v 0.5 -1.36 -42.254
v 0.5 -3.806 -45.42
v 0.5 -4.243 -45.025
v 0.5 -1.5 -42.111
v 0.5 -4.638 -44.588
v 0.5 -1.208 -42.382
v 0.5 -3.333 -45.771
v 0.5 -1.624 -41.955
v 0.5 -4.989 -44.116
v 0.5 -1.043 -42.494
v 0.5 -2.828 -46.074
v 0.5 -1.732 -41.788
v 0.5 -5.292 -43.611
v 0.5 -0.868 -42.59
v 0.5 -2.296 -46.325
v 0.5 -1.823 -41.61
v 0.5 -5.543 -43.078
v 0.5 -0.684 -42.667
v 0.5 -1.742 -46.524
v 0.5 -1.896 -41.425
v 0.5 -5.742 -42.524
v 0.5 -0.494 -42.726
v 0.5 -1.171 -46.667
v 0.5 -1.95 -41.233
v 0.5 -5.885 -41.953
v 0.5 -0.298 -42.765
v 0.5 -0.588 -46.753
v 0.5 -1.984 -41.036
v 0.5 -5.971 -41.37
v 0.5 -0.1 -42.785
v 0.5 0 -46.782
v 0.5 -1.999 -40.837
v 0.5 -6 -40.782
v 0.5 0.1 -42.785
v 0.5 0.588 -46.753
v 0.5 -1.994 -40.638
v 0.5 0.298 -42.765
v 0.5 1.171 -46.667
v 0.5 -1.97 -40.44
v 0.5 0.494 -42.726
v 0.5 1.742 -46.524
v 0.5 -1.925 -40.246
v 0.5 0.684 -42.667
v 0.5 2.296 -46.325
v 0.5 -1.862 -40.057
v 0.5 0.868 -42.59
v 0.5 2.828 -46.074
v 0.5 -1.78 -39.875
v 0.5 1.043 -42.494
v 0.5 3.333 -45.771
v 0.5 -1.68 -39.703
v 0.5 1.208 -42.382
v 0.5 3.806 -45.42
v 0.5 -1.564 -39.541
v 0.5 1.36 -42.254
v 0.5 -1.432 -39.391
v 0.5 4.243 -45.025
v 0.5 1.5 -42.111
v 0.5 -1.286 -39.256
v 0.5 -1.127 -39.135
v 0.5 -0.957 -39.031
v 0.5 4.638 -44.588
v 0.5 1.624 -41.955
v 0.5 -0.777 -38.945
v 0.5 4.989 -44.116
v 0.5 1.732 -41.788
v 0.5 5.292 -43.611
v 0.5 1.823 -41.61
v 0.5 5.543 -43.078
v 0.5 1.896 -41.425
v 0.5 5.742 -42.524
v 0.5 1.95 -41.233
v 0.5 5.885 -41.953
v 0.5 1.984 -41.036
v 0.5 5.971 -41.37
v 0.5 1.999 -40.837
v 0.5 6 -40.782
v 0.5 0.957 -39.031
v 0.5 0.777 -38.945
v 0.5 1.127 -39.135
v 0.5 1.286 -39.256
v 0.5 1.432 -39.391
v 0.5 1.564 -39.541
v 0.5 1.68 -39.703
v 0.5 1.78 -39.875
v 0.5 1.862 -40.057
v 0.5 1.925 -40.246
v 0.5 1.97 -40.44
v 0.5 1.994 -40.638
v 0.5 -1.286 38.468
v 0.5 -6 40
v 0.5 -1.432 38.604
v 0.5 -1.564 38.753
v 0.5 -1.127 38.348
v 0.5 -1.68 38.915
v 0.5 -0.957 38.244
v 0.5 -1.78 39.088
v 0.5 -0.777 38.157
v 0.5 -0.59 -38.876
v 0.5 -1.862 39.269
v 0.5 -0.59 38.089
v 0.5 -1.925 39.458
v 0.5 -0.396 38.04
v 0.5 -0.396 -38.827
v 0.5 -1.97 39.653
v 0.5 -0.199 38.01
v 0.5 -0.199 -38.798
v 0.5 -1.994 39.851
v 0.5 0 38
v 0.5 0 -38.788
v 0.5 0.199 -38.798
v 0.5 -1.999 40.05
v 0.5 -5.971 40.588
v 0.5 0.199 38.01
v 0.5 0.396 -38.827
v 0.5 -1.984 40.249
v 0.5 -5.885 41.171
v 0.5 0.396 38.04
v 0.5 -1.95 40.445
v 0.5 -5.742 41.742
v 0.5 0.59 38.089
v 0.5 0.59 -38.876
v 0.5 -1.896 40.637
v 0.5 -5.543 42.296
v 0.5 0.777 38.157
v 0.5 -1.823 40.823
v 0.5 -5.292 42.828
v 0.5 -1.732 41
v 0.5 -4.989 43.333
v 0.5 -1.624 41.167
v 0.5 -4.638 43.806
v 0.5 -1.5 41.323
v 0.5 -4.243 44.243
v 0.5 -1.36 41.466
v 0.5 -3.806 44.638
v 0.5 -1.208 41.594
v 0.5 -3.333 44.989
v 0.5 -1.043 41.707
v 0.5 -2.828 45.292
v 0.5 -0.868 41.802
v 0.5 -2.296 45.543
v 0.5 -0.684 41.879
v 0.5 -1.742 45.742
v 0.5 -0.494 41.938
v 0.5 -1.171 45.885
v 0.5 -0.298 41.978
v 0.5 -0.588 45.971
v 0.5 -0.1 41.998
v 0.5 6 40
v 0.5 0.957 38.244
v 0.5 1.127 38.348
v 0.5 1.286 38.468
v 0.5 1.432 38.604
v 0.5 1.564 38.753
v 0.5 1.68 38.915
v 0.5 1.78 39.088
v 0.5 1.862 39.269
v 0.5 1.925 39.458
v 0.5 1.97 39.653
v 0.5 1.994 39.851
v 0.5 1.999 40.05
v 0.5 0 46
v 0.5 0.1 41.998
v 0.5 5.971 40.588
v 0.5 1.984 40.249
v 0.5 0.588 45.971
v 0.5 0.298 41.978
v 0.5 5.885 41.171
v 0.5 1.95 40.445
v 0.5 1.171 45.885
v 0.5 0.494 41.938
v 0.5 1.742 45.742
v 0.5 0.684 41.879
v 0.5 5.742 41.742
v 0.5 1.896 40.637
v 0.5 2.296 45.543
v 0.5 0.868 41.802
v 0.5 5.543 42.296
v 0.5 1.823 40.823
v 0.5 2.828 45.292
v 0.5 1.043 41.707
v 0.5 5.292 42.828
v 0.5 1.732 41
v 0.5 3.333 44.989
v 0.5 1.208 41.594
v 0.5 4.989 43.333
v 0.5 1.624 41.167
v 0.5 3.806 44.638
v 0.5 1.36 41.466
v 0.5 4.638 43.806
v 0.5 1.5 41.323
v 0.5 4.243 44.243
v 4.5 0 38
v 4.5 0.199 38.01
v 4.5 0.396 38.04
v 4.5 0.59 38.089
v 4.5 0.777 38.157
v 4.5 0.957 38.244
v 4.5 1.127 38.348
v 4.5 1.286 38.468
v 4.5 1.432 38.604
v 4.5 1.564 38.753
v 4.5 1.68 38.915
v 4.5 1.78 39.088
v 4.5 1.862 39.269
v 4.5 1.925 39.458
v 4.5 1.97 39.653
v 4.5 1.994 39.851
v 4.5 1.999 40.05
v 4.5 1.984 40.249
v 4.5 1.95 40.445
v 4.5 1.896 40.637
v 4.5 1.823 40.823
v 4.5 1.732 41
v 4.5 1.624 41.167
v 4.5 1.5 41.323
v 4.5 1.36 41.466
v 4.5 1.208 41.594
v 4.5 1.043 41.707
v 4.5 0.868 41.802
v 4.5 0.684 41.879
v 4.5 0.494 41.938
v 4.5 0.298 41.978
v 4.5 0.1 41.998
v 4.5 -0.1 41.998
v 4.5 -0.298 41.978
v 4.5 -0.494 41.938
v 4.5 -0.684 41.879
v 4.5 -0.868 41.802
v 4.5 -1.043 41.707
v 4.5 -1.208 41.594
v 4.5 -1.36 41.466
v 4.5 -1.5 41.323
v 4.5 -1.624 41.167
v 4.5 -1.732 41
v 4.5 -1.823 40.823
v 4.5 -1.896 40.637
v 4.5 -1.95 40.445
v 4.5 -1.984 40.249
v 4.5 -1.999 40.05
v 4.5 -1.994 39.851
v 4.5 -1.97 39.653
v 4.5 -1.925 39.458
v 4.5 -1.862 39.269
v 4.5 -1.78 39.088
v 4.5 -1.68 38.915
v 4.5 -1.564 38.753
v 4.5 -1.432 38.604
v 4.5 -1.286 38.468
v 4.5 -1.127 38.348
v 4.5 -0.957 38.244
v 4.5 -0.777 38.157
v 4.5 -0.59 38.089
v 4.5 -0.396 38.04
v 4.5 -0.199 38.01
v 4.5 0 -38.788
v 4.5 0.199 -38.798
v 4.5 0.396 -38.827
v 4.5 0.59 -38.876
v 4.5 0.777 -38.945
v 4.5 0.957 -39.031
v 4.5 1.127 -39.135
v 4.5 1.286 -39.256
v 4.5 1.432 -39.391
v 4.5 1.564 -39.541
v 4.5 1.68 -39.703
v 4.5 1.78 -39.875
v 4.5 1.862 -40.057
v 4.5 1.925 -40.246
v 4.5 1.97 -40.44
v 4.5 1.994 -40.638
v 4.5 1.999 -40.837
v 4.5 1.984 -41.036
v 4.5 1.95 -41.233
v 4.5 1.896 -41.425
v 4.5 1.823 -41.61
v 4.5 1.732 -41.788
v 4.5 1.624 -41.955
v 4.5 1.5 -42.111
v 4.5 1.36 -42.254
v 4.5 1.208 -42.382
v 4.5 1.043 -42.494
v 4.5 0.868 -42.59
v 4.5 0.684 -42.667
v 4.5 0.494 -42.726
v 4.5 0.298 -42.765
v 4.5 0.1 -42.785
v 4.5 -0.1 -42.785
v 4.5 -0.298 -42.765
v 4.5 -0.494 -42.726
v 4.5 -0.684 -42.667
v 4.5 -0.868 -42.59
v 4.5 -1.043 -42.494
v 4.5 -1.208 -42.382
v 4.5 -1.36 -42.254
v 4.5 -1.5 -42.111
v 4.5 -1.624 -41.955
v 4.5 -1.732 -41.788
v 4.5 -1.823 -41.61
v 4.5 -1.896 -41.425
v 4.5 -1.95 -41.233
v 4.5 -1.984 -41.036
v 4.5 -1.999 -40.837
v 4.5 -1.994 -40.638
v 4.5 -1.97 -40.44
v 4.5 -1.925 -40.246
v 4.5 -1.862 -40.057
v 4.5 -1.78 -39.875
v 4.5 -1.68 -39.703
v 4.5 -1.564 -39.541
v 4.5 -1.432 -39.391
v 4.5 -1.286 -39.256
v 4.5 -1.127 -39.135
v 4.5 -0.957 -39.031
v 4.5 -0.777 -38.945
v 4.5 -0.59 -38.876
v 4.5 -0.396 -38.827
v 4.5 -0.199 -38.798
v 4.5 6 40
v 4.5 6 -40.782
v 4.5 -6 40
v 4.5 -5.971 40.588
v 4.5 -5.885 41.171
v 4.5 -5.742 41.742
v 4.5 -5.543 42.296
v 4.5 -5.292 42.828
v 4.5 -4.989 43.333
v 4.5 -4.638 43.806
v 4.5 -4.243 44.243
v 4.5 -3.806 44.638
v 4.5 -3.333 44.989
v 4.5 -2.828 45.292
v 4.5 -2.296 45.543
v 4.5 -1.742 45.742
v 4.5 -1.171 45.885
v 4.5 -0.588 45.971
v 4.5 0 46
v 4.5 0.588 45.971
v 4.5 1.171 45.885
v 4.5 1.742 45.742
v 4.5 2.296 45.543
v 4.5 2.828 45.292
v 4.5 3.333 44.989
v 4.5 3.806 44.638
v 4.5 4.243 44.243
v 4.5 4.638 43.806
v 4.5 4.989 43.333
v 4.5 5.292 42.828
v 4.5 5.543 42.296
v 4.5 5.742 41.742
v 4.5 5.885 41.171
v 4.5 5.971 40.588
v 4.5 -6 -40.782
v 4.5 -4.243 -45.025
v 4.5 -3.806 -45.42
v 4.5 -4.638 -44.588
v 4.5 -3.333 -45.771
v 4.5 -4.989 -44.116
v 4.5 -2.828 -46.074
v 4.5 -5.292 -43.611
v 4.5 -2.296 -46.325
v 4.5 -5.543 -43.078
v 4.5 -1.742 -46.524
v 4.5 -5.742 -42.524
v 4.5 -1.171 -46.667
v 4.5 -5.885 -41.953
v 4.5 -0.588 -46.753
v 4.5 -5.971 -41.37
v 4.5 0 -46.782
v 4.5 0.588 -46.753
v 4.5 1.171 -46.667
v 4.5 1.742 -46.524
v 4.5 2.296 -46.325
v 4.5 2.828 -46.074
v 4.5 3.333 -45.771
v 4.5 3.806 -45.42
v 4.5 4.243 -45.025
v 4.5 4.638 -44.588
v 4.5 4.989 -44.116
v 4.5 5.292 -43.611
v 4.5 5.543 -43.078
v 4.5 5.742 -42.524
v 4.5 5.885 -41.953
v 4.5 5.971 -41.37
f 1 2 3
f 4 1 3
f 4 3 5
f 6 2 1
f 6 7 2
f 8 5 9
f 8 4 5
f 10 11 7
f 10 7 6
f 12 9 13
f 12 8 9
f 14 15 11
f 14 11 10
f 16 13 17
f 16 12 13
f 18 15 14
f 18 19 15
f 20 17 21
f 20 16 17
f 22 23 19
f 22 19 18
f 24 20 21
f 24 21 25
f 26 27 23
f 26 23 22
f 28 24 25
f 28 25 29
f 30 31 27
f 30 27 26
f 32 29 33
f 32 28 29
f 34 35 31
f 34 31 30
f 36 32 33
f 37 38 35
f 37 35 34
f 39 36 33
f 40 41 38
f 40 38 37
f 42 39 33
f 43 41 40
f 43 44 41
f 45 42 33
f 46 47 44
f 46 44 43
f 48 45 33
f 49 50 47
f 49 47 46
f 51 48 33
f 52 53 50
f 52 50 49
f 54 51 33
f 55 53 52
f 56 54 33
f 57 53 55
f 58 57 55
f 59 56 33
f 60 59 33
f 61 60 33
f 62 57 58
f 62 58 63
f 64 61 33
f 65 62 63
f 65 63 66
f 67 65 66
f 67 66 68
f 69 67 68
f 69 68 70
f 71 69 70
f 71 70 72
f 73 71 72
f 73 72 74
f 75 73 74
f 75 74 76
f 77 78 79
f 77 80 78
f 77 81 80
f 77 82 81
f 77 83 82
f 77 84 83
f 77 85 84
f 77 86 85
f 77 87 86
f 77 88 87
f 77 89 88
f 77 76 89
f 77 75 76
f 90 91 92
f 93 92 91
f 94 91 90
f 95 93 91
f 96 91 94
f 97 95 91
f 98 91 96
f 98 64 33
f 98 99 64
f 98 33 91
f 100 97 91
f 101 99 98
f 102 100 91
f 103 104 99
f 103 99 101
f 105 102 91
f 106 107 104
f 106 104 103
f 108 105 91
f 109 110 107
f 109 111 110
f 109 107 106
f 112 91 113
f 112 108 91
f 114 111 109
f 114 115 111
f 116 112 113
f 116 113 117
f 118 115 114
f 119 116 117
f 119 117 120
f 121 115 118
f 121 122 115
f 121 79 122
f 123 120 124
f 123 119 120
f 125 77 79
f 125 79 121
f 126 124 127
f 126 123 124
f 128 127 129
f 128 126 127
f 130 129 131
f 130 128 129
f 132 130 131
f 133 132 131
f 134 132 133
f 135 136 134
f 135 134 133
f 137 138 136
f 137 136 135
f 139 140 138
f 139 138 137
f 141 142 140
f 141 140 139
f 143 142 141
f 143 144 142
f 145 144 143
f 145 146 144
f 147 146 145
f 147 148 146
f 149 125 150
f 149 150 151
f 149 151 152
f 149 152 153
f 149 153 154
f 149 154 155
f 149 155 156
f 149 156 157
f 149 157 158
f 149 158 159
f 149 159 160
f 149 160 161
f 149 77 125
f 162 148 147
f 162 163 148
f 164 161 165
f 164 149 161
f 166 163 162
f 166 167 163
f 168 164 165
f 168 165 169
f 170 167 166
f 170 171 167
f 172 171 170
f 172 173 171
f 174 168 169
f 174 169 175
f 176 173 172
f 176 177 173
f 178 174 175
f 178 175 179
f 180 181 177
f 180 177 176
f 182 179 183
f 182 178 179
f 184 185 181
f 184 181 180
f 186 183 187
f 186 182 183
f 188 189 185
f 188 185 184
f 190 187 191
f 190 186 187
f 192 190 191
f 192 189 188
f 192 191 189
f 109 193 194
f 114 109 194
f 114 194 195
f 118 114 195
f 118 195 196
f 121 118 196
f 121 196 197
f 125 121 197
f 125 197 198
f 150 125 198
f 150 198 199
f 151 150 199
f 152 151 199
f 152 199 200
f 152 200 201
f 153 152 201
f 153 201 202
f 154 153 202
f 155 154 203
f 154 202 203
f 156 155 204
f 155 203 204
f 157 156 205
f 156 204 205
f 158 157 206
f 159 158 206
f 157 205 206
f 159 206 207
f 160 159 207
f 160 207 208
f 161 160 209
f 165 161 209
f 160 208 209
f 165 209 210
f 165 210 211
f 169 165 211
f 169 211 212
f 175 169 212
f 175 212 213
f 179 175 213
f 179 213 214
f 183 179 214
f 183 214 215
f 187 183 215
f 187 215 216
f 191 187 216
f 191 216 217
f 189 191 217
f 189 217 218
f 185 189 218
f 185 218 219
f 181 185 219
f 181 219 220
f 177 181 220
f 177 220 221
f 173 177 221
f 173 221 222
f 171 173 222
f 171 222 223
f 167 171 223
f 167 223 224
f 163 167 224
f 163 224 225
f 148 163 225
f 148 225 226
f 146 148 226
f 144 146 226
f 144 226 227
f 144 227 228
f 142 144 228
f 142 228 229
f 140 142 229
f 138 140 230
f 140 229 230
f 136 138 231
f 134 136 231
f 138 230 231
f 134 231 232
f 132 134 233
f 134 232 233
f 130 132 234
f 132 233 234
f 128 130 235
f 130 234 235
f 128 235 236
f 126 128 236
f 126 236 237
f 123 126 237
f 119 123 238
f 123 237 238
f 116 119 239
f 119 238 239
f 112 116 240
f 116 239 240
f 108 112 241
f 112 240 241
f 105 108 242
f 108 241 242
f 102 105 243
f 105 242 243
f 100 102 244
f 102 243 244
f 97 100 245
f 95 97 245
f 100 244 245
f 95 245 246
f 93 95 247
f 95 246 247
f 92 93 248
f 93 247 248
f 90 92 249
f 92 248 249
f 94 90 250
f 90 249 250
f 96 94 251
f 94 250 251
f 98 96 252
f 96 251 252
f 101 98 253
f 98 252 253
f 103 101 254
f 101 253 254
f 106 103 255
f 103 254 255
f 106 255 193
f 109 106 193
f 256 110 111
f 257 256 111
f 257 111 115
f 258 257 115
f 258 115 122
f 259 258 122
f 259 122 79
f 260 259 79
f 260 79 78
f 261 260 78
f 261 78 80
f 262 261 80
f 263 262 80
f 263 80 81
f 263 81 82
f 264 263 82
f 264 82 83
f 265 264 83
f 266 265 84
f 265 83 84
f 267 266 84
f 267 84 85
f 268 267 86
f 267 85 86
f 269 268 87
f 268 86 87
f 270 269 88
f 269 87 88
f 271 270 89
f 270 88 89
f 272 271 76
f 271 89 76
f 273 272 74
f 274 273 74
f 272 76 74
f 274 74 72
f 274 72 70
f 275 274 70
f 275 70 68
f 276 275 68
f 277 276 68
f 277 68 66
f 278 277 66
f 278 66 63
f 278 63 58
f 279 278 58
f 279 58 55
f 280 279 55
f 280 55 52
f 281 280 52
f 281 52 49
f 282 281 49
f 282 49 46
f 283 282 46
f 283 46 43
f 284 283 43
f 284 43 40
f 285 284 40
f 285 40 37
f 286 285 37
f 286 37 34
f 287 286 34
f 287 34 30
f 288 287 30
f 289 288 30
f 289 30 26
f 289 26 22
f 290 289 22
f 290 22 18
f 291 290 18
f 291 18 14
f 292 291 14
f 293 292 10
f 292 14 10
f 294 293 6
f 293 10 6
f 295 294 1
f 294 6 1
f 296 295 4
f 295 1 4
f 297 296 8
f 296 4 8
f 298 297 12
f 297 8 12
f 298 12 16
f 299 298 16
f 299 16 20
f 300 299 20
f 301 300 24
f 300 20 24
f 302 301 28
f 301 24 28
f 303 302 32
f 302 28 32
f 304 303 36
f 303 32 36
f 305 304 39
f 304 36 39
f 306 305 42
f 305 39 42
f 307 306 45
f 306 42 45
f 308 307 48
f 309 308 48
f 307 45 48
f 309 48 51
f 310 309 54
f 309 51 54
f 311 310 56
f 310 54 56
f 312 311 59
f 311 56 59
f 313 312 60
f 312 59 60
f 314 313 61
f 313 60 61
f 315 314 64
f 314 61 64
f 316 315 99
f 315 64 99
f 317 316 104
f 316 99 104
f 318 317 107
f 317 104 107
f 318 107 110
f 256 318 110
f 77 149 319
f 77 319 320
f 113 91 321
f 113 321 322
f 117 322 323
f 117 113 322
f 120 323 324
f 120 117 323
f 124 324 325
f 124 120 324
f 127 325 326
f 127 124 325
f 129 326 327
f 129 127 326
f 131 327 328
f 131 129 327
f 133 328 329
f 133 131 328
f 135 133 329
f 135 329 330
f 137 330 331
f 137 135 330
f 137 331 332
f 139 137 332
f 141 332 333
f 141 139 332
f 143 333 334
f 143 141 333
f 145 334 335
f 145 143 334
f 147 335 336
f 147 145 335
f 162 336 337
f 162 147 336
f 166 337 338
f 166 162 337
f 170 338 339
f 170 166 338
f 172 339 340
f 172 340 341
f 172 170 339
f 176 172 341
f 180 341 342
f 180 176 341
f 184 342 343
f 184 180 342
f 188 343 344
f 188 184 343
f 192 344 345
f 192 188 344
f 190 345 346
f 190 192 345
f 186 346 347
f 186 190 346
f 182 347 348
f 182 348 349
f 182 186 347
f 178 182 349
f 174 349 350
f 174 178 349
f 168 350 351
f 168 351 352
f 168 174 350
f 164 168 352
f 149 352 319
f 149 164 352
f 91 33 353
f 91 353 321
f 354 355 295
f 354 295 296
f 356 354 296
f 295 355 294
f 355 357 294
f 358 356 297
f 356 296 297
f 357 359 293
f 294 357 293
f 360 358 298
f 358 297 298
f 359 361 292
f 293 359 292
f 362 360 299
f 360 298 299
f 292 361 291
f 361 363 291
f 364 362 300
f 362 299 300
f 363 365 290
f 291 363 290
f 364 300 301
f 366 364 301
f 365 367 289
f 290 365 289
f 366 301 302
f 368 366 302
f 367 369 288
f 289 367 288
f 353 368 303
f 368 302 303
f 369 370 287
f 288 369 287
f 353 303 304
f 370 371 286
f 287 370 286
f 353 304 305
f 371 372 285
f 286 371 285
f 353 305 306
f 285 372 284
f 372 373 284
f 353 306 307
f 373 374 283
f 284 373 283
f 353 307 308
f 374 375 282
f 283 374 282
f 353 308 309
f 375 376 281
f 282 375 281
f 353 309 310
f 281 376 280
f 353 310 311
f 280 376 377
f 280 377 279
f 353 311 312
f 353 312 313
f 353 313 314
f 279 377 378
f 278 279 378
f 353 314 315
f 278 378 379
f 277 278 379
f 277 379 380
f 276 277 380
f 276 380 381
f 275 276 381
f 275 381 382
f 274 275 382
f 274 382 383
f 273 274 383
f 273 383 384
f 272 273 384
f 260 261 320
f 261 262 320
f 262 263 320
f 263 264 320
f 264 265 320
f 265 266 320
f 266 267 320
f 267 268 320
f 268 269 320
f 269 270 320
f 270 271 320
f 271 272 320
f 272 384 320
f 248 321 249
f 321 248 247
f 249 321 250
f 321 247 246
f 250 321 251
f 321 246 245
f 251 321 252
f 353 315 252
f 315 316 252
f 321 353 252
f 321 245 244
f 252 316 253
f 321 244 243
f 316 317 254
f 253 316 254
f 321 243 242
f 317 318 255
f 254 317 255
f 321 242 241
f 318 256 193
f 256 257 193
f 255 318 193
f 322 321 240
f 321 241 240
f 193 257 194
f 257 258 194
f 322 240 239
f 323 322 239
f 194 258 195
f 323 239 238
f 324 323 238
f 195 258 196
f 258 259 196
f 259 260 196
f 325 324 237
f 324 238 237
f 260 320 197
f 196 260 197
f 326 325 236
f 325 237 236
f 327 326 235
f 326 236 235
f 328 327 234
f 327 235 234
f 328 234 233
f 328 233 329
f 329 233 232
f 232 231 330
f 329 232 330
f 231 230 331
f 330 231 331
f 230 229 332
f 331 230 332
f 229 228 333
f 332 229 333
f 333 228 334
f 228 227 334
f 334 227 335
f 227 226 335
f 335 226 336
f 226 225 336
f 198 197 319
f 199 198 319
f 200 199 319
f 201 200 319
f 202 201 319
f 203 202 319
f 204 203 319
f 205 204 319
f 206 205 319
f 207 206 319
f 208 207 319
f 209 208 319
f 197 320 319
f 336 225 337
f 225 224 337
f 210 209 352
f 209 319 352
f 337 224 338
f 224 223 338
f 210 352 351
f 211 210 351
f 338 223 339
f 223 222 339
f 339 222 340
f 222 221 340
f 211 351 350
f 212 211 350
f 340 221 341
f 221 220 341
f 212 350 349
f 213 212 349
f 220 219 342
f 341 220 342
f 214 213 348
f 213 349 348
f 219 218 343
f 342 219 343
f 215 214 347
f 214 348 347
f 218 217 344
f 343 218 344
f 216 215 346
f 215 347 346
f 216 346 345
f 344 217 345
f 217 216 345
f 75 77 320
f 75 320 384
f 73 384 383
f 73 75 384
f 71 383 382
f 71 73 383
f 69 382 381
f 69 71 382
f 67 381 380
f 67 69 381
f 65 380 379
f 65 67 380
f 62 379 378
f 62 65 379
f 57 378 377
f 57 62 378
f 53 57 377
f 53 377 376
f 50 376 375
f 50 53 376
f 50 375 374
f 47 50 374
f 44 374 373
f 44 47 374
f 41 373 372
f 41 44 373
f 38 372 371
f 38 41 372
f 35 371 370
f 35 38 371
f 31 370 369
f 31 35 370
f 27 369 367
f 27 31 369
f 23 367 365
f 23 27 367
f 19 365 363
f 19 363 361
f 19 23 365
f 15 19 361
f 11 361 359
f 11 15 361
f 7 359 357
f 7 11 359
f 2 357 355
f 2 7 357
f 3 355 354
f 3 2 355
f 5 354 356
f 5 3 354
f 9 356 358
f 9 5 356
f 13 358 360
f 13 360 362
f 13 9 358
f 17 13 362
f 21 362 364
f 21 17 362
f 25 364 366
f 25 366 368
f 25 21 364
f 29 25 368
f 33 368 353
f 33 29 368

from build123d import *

# Parameters (mm, degrees)
SKETCH1_R           = 2.4
BOSS_EXTRUDE1_DEPTH = 5
SCALE1_SCALE        = 0.8
SKETCH2_R           = 2
CUT_EXTRUDE1_DEPTH  = 47.561786907
SKETCH4_R           = 2
BOSS_EXTRUDE2_DEPTH = 4
BOSS_EXTRUDE3_DEPTH = 4
SKETCH7_R           = 2
CUT_EXTRUDE2_DEPTH  = 48.334629336


with BuildPart() as part:
    # Sketch1 → Boss-Extrude1 (new body)
    with BuildSketch(Plane(origin=(0, 0, 0), x_dir=(0, 0, -1), z_dir=(1, 0, 0))):
        with BuildLine():
            Line((-50, 7.5), (50, 7.5))
            ThreePointArc((50, 7.5), (57.5, 0), (50, -7.5))
            Line((50, -7.5), (-50, -7.5))
            ThreePointArc((-50, -7.5), (-57.5, 0), (-50, 7.5))
        make_face()
        with Locations((-50, 0)):
            Circle(SKETCH1_R, mode=Mode.SUBTRACT)
        with Locations((50, 0)):
            Circle(SKETCH1_R, mode=Mode.SUBTRACT)
    extrude(amount=BOSS_EXTRUDE1_DEPTH)


with BuildPart() as part_1:
    # Scale1: scaled about (2.5, 0, 0)
    add(part.part.scale(SCALE1_SCALE).moved(Location((0.5, 0, 0))))

    # Sketch2 → Cut-Extrude1 (cut, through all)
    with BuildSketch(Plane(origin=(4.5, 0, 0), x_dir=(0, 0, -1), z_dir=(1, 0, 0))):
        with Locations((-40, 0)):
            Circle(SKETCH2_R)
        with Locations((40, 0)):
            Circle(SKETCH2_R)
    extrude(amount=-CUT_EXTRUDE1_DEPTH, mode=Mode.SUBTRACT)

    # Sketch4 → Boss-Extrude2 (add, through all)
    with BuildSketch(Plane.ZY.offset(-0.5)):
        with Locations((-40, 0)):
            Circle(SKETCH4_R)
    extrude(amount=-BOSS_EXTRUDE2_DEPTH)

    # Sketch6 → Boss-Extrude3 (add, through all)
    with BuildSketch(Plane.ZY.offset(-0.5)):
        with BuildLine():
            Line((-40.78212409, -6), (-33.634711985, -6))
            Line((-33.634711985, -6), (-33.634711985, 6))
            Line((-33.634711985, 6), (-40.78212409, 6))
            ThreePointArc((-40.78212409, 6), (-46.78212409, 0), (-40.78212409, -6))
        make_face()
    extrude(amount=-BOSS_EXTRUDE3_DEPTH)

    # Sketch7 → Cut-Extrude2 (cut, through all)
    with BuildSketch(Plane.ZY.offset(-0.5)):
        with Locations((-40.78760592, 0)):
            Circle(SKETCH7_R)
    extrude(amount=-CUT_EXTRUDE2_DEPTH, mode=Mode.SUBTRACT)


solid = part_1.part
